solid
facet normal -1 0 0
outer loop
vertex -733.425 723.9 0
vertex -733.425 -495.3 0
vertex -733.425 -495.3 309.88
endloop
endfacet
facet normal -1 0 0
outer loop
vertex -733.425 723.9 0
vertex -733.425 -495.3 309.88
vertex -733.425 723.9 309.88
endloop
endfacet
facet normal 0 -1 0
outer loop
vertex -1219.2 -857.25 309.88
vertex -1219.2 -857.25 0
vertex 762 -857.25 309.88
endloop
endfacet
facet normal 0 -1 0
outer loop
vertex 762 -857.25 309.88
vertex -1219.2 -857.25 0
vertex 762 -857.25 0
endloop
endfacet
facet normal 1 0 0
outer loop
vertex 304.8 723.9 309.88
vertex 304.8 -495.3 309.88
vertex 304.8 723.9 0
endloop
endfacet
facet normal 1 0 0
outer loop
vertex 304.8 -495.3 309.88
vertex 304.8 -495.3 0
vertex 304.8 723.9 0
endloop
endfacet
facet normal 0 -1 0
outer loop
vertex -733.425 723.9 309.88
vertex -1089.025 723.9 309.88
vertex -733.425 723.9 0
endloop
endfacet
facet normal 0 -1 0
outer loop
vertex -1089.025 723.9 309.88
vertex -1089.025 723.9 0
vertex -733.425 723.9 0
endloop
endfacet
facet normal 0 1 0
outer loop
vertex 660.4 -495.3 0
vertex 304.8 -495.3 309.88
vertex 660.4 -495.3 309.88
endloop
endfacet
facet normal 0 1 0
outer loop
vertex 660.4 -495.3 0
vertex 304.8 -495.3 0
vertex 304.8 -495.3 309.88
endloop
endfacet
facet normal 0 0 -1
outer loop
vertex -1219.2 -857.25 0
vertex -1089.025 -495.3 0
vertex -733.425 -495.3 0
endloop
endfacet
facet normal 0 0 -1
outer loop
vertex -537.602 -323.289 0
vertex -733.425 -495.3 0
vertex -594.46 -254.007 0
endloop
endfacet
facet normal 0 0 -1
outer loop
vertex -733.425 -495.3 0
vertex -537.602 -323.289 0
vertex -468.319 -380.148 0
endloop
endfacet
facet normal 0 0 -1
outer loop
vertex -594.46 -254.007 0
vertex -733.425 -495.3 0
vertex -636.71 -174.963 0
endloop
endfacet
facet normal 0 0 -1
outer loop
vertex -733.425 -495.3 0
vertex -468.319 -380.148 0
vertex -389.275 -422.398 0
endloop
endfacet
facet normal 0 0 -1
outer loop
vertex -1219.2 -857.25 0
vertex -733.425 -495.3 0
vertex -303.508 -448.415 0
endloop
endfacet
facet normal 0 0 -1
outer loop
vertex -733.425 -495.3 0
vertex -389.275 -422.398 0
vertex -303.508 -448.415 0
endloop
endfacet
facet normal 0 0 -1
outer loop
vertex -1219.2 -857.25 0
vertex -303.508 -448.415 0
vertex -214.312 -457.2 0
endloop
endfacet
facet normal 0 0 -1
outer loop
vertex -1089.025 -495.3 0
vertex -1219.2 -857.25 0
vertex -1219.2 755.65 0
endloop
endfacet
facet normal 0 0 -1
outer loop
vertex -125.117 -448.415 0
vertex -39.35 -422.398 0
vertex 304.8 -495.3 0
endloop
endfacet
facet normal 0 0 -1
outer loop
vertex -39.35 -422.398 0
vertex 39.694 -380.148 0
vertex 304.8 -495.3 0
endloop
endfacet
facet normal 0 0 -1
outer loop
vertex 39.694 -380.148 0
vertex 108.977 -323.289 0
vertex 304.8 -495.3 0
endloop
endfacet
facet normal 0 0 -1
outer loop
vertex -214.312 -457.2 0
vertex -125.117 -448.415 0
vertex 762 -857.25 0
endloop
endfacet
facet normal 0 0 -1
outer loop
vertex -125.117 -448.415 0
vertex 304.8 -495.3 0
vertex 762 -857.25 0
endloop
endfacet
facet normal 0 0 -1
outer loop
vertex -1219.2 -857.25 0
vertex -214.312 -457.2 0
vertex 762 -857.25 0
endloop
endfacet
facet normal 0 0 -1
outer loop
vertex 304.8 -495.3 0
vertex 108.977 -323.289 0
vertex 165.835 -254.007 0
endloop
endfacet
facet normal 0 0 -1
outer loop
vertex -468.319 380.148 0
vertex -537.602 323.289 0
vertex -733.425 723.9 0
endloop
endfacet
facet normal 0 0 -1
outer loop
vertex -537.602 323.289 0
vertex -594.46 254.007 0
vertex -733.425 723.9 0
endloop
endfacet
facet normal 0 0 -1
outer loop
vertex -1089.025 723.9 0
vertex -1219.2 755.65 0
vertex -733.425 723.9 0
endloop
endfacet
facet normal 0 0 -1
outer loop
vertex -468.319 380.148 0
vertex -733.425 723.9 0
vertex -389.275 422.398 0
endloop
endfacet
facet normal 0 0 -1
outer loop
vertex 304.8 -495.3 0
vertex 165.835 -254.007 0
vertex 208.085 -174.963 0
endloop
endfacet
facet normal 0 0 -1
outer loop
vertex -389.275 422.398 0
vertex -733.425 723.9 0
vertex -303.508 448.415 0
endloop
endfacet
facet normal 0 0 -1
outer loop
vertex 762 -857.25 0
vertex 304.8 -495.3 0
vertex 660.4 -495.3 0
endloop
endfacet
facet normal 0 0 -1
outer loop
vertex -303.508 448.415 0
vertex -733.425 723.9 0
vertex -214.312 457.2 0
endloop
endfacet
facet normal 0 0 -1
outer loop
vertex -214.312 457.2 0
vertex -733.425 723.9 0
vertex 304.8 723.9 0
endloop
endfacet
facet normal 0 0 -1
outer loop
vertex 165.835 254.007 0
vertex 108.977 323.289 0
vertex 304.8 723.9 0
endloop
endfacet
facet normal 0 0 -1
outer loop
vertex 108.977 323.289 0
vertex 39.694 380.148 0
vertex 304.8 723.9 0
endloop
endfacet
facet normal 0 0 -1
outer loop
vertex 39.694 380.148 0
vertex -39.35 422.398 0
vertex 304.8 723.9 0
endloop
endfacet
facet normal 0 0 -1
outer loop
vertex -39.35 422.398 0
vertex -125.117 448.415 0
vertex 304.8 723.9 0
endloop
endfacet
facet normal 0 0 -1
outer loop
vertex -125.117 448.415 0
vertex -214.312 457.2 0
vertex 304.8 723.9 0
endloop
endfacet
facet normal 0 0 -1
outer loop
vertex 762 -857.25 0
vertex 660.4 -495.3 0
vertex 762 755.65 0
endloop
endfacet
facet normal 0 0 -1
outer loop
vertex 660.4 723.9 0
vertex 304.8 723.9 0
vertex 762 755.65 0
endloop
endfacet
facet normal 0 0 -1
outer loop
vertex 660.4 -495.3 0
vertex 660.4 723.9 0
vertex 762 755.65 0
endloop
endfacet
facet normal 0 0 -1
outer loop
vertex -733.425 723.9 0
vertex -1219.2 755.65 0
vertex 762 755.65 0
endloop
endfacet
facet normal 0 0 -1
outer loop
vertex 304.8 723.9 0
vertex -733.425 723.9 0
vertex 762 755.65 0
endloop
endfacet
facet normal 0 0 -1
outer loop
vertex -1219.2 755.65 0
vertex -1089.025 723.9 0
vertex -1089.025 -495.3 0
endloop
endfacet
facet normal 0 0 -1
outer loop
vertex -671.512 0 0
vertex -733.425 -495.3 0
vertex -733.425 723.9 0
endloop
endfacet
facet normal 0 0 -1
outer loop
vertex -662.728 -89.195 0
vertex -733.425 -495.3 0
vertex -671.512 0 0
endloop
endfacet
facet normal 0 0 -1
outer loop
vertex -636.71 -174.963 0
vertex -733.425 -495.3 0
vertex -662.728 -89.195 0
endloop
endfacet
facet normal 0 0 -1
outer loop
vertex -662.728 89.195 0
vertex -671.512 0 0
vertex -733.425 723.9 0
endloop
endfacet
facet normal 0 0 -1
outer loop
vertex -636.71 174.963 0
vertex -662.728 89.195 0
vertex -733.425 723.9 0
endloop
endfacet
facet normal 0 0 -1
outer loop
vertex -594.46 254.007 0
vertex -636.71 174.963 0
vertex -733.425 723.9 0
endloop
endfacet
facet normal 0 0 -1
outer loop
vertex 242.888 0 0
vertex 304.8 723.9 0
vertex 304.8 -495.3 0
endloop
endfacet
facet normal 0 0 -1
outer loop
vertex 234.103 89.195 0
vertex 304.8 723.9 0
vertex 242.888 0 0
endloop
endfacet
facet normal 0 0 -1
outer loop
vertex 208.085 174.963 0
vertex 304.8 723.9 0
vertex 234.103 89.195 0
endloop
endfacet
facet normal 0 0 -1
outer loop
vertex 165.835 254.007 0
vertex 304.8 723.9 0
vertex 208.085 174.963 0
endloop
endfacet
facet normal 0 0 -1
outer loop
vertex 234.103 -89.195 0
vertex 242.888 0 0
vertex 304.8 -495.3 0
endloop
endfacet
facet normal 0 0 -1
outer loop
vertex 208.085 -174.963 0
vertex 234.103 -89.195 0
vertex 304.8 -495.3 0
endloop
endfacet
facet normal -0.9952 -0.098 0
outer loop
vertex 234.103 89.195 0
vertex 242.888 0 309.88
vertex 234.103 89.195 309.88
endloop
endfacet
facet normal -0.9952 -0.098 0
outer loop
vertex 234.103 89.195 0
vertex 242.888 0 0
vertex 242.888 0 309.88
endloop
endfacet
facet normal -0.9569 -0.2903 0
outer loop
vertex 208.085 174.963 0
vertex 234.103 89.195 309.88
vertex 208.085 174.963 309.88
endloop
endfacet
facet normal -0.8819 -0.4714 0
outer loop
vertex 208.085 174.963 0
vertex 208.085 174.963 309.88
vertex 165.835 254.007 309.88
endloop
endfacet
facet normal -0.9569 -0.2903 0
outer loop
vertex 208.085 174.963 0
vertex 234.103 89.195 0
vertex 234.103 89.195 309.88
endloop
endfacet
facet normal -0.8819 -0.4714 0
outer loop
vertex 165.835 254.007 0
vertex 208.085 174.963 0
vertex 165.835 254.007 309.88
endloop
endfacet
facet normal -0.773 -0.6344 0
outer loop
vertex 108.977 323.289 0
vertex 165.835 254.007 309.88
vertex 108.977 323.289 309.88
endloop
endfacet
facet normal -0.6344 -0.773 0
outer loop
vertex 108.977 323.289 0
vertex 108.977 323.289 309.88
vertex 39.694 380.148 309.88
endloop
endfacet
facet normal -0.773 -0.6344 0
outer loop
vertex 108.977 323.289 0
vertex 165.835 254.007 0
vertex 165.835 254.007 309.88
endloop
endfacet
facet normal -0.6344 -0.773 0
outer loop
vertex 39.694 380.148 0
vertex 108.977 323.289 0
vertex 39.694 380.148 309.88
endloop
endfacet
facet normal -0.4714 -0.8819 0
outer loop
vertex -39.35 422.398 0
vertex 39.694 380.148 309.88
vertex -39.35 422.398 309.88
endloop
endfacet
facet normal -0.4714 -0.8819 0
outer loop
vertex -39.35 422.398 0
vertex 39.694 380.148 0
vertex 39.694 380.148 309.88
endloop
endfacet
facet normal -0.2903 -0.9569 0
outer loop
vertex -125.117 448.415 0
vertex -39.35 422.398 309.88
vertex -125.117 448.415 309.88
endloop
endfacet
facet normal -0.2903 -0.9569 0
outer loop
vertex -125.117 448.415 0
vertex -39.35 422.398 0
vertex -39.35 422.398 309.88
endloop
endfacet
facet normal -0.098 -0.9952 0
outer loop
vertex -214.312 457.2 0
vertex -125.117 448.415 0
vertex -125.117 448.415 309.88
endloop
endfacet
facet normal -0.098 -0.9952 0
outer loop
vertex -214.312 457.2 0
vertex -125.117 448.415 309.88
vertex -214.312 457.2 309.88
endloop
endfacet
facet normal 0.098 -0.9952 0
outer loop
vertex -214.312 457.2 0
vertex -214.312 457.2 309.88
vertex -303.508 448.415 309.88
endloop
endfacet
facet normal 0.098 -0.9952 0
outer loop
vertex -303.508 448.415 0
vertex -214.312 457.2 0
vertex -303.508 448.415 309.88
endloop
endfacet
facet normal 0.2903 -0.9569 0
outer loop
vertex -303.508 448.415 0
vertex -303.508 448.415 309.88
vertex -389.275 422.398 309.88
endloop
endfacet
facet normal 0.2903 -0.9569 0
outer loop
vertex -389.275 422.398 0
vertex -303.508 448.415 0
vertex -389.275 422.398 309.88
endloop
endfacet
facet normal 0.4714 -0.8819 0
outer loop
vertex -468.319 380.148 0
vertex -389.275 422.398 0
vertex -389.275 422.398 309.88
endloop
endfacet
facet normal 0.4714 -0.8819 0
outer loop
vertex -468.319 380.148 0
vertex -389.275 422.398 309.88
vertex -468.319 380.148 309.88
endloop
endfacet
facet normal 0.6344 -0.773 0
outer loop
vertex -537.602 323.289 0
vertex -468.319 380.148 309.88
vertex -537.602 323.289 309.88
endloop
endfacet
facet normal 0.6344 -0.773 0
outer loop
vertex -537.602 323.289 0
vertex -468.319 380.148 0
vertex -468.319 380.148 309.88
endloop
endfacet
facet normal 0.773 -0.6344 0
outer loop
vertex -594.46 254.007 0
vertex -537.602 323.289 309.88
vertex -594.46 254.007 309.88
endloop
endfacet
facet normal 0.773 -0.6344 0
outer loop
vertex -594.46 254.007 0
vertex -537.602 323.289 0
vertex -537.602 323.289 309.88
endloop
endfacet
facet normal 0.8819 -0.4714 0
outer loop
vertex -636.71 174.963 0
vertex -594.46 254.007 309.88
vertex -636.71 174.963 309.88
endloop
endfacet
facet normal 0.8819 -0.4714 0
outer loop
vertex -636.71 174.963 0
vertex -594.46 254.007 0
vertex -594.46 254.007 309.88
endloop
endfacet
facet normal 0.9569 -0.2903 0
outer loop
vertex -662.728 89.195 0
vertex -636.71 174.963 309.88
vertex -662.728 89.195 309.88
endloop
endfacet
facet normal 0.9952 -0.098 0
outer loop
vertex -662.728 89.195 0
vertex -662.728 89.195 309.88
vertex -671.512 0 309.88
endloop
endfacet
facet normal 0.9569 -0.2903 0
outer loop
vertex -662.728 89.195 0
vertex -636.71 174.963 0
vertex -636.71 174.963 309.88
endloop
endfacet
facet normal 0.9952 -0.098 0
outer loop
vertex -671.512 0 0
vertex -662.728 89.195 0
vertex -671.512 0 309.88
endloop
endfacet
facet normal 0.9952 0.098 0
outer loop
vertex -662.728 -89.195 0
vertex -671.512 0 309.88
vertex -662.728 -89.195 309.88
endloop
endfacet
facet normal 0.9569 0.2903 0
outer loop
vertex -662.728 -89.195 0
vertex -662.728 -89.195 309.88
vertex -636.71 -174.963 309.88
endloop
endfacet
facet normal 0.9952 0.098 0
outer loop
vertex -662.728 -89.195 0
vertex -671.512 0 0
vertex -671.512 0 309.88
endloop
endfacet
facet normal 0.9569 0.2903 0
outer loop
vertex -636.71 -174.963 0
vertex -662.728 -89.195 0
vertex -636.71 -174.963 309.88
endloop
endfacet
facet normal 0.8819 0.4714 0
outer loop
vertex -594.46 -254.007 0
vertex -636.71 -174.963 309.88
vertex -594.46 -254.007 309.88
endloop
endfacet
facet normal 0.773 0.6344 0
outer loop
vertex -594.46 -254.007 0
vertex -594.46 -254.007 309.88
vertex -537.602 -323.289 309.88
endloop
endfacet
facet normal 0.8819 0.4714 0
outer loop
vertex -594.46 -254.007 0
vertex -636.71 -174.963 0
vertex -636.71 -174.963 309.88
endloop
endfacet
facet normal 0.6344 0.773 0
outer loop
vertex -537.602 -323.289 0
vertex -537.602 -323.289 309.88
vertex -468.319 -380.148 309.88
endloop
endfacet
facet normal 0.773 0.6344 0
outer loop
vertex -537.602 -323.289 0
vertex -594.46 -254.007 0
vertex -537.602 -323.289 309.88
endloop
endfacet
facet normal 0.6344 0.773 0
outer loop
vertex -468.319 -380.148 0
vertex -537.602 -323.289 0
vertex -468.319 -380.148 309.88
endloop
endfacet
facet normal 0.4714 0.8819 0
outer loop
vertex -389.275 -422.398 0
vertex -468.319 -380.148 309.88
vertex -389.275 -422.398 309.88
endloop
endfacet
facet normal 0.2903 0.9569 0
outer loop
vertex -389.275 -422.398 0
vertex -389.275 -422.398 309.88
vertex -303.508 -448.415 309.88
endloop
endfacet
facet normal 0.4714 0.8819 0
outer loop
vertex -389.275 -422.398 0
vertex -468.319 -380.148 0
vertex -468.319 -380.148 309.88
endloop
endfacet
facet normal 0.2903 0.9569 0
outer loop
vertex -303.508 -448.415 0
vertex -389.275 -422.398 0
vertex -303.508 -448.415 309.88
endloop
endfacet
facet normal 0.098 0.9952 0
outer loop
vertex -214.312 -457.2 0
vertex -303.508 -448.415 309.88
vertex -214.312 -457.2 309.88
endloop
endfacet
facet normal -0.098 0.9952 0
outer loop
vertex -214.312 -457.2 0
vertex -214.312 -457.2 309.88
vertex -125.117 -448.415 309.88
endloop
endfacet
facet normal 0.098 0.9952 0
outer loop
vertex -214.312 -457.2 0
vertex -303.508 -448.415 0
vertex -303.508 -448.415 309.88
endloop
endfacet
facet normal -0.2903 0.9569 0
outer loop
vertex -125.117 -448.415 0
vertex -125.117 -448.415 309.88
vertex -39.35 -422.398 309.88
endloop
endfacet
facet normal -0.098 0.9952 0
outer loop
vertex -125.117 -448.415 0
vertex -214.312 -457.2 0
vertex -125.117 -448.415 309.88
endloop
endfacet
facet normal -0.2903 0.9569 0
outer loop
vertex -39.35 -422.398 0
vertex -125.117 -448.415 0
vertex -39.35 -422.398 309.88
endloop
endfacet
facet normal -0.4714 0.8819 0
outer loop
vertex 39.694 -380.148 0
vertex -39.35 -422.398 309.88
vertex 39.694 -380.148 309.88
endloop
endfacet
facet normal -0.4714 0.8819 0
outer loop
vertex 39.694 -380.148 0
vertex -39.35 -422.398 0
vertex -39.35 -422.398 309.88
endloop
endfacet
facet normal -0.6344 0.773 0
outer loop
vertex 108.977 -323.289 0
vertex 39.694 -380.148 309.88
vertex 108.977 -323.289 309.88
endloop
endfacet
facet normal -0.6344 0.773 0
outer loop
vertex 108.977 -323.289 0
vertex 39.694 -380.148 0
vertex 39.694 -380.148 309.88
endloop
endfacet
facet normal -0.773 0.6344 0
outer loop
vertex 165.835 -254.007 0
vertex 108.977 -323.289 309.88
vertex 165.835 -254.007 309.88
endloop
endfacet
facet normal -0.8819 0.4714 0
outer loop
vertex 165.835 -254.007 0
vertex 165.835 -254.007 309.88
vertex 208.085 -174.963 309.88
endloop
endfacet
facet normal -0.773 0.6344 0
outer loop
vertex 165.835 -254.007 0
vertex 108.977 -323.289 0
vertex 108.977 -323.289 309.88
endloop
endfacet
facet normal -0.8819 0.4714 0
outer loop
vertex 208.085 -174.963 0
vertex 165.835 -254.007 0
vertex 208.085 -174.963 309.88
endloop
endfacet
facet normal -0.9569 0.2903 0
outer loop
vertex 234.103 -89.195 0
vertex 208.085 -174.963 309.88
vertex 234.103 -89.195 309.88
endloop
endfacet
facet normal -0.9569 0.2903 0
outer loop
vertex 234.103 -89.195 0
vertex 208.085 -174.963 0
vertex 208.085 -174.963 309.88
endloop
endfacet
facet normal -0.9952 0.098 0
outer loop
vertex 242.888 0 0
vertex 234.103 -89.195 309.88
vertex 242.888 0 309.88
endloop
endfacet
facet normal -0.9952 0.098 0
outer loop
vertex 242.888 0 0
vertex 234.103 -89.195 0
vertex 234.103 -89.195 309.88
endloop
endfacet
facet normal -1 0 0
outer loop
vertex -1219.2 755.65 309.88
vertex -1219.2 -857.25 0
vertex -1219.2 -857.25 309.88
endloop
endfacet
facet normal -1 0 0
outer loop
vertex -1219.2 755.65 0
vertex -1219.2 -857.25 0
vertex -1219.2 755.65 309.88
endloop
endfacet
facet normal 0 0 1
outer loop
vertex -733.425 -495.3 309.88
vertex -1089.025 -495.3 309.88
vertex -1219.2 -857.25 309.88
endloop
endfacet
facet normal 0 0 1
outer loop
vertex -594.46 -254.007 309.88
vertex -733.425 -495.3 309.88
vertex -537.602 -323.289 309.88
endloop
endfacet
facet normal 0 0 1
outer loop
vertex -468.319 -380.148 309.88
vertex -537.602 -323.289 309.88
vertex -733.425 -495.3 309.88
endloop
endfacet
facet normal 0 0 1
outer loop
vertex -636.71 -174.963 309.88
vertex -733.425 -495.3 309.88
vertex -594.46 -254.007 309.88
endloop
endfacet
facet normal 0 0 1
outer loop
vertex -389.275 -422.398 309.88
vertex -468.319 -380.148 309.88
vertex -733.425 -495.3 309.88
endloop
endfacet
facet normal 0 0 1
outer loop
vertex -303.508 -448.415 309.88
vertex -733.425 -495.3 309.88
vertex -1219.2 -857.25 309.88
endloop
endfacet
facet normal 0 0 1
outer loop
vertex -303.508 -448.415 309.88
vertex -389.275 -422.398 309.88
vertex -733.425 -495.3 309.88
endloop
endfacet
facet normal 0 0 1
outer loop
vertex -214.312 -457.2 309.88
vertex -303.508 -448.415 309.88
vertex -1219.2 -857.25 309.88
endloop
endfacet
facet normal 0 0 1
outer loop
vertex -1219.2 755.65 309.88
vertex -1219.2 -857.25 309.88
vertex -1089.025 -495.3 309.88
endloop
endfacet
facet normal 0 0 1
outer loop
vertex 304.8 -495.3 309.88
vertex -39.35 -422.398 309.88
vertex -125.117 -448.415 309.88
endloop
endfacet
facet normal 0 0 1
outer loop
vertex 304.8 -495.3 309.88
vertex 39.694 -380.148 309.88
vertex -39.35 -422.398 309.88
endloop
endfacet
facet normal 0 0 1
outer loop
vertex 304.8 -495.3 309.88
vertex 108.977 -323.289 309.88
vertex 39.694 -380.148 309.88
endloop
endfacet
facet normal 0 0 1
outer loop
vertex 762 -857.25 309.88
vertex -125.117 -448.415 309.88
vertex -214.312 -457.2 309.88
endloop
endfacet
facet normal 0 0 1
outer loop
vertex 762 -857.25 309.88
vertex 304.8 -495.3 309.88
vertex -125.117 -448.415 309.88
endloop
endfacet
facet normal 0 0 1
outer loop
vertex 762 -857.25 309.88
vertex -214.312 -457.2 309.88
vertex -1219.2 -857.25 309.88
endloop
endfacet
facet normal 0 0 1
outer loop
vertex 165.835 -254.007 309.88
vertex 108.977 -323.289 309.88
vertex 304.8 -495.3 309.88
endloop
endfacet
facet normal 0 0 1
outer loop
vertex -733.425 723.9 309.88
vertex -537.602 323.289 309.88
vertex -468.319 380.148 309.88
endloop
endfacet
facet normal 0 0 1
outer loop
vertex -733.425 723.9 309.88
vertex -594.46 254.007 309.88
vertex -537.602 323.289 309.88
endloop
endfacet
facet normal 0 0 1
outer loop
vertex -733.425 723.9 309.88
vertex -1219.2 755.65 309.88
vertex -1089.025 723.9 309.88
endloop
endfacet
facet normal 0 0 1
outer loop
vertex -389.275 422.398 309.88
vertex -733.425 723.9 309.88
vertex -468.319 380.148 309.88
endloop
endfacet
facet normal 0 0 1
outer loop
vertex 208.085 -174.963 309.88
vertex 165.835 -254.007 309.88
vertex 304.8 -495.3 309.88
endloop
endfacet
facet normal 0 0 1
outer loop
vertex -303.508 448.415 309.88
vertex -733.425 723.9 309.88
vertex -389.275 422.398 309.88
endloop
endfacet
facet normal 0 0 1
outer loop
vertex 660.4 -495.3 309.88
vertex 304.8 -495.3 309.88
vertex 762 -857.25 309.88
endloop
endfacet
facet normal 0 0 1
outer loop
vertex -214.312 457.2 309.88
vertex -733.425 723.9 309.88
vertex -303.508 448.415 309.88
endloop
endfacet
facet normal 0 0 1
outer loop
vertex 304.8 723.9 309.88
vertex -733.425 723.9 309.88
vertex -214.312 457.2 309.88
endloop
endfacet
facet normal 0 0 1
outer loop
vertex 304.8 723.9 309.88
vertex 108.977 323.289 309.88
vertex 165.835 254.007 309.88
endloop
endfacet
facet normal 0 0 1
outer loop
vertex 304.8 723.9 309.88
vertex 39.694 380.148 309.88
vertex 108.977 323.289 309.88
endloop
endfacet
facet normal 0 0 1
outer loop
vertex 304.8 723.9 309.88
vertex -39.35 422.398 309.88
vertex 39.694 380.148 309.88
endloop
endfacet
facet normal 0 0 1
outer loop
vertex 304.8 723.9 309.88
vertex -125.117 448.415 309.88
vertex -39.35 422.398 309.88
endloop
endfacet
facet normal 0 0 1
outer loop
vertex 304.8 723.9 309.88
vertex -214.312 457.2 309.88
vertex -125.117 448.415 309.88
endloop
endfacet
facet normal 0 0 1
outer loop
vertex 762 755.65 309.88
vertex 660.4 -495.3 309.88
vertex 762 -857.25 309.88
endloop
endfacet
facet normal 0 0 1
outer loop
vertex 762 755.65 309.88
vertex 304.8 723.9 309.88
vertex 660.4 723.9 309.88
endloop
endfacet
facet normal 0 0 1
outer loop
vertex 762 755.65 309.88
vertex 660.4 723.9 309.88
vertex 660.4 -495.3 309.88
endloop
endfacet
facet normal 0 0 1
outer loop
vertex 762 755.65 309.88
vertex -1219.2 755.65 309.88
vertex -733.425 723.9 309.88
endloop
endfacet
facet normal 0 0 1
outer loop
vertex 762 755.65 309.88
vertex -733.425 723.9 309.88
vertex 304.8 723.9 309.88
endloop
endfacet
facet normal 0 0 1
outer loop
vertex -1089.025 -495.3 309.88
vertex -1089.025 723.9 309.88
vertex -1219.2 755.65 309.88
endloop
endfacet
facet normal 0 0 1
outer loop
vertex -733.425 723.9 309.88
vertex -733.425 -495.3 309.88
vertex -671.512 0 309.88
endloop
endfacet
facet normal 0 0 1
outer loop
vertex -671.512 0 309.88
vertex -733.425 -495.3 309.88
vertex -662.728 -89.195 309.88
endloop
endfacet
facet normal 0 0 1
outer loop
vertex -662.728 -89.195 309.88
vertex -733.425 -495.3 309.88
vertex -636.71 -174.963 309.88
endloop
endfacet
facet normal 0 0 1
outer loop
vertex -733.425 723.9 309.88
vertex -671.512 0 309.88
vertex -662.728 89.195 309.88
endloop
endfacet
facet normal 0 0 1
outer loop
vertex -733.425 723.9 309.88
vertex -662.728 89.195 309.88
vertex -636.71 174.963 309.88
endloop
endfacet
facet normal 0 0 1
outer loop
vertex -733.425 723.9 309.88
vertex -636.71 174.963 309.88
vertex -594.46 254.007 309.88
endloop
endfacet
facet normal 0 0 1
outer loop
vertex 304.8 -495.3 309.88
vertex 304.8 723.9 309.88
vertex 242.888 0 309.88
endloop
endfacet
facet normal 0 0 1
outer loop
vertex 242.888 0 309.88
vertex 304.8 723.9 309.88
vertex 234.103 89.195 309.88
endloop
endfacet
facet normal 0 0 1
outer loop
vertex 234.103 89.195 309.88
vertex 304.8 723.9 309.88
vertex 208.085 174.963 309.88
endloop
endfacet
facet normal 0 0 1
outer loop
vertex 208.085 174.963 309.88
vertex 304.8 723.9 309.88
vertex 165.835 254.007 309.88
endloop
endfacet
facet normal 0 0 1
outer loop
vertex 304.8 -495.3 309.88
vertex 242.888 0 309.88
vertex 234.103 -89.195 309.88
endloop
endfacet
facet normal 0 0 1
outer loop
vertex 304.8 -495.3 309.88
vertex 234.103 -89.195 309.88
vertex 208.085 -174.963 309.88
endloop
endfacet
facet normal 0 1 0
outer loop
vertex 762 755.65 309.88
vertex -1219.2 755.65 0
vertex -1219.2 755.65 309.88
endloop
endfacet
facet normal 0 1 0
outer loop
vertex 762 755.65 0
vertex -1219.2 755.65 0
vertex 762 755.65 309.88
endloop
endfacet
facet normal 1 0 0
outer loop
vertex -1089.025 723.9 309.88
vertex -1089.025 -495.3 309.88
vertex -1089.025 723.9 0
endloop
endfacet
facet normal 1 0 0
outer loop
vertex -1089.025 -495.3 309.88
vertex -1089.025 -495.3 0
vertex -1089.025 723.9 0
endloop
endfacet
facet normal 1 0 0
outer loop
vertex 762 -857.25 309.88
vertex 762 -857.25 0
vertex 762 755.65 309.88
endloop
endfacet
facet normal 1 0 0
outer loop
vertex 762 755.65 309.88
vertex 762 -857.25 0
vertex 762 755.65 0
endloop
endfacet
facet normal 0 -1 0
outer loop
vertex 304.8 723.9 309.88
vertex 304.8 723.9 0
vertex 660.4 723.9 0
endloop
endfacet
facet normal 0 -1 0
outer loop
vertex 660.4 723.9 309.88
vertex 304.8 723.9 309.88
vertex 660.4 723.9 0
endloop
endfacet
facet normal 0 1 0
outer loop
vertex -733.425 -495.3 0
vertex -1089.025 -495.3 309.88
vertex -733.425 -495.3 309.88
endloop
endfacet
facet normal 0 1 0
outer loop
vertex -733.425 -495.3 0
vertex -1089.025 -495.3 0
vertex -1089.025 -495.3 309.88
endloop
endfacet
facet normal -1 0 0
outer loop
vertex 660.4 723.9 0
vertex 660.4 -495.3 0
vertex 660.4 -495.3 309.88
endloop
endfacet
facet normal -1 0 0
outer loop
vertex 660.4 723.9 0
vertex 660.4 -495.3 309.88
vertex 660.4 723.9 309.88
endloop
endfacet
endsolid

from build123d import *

# Parameters (mm, degrees)
F0_W     = 1981.2
F0_H     = 1612.9
F0_W_2   = 355.6
F0_H_2   = 1219.2
F0_R     = 457.2
F1_DEPTH = 101.6
F2_DEPTH = 208.28


# Not quite as in the source:
# - the program builds the solid bodies; features that only make, move or delete a surface that nothing else refers to are left out


with BuildPart() as f1:
    # F0 (on Top) → F1 (new body)
    with BuildSketch(Plane.XY):
        with Locations((-228.6, -50.8)):
            Rectangle(F0_W, F0_H)
        with Locations((-911.225, 114.3)):
            Rectangle(F0_W_2, F0_H_2, mode=Mode.SUBTRACT)
        with Locations((-214.3125, 0)):
            Circle(F0_R, mode=Mode.SUBTRACT)
        with Locations((482.6, 114.3)):
            Rectangle(F0_W_2, F0_H_2, mode=Mode.SUBTRACT)
    extrude(amount=F1_DEPTH)

    # F2 (add): a face of the model
    f2_faces = [f1.faces().sort_by_distance(p)[0] for p in [
        (736.4527890955, -50.8, 101.6),
    ]]
    extrude(f2_faces, amount=F2_DEPTH)


solid = f1.part
